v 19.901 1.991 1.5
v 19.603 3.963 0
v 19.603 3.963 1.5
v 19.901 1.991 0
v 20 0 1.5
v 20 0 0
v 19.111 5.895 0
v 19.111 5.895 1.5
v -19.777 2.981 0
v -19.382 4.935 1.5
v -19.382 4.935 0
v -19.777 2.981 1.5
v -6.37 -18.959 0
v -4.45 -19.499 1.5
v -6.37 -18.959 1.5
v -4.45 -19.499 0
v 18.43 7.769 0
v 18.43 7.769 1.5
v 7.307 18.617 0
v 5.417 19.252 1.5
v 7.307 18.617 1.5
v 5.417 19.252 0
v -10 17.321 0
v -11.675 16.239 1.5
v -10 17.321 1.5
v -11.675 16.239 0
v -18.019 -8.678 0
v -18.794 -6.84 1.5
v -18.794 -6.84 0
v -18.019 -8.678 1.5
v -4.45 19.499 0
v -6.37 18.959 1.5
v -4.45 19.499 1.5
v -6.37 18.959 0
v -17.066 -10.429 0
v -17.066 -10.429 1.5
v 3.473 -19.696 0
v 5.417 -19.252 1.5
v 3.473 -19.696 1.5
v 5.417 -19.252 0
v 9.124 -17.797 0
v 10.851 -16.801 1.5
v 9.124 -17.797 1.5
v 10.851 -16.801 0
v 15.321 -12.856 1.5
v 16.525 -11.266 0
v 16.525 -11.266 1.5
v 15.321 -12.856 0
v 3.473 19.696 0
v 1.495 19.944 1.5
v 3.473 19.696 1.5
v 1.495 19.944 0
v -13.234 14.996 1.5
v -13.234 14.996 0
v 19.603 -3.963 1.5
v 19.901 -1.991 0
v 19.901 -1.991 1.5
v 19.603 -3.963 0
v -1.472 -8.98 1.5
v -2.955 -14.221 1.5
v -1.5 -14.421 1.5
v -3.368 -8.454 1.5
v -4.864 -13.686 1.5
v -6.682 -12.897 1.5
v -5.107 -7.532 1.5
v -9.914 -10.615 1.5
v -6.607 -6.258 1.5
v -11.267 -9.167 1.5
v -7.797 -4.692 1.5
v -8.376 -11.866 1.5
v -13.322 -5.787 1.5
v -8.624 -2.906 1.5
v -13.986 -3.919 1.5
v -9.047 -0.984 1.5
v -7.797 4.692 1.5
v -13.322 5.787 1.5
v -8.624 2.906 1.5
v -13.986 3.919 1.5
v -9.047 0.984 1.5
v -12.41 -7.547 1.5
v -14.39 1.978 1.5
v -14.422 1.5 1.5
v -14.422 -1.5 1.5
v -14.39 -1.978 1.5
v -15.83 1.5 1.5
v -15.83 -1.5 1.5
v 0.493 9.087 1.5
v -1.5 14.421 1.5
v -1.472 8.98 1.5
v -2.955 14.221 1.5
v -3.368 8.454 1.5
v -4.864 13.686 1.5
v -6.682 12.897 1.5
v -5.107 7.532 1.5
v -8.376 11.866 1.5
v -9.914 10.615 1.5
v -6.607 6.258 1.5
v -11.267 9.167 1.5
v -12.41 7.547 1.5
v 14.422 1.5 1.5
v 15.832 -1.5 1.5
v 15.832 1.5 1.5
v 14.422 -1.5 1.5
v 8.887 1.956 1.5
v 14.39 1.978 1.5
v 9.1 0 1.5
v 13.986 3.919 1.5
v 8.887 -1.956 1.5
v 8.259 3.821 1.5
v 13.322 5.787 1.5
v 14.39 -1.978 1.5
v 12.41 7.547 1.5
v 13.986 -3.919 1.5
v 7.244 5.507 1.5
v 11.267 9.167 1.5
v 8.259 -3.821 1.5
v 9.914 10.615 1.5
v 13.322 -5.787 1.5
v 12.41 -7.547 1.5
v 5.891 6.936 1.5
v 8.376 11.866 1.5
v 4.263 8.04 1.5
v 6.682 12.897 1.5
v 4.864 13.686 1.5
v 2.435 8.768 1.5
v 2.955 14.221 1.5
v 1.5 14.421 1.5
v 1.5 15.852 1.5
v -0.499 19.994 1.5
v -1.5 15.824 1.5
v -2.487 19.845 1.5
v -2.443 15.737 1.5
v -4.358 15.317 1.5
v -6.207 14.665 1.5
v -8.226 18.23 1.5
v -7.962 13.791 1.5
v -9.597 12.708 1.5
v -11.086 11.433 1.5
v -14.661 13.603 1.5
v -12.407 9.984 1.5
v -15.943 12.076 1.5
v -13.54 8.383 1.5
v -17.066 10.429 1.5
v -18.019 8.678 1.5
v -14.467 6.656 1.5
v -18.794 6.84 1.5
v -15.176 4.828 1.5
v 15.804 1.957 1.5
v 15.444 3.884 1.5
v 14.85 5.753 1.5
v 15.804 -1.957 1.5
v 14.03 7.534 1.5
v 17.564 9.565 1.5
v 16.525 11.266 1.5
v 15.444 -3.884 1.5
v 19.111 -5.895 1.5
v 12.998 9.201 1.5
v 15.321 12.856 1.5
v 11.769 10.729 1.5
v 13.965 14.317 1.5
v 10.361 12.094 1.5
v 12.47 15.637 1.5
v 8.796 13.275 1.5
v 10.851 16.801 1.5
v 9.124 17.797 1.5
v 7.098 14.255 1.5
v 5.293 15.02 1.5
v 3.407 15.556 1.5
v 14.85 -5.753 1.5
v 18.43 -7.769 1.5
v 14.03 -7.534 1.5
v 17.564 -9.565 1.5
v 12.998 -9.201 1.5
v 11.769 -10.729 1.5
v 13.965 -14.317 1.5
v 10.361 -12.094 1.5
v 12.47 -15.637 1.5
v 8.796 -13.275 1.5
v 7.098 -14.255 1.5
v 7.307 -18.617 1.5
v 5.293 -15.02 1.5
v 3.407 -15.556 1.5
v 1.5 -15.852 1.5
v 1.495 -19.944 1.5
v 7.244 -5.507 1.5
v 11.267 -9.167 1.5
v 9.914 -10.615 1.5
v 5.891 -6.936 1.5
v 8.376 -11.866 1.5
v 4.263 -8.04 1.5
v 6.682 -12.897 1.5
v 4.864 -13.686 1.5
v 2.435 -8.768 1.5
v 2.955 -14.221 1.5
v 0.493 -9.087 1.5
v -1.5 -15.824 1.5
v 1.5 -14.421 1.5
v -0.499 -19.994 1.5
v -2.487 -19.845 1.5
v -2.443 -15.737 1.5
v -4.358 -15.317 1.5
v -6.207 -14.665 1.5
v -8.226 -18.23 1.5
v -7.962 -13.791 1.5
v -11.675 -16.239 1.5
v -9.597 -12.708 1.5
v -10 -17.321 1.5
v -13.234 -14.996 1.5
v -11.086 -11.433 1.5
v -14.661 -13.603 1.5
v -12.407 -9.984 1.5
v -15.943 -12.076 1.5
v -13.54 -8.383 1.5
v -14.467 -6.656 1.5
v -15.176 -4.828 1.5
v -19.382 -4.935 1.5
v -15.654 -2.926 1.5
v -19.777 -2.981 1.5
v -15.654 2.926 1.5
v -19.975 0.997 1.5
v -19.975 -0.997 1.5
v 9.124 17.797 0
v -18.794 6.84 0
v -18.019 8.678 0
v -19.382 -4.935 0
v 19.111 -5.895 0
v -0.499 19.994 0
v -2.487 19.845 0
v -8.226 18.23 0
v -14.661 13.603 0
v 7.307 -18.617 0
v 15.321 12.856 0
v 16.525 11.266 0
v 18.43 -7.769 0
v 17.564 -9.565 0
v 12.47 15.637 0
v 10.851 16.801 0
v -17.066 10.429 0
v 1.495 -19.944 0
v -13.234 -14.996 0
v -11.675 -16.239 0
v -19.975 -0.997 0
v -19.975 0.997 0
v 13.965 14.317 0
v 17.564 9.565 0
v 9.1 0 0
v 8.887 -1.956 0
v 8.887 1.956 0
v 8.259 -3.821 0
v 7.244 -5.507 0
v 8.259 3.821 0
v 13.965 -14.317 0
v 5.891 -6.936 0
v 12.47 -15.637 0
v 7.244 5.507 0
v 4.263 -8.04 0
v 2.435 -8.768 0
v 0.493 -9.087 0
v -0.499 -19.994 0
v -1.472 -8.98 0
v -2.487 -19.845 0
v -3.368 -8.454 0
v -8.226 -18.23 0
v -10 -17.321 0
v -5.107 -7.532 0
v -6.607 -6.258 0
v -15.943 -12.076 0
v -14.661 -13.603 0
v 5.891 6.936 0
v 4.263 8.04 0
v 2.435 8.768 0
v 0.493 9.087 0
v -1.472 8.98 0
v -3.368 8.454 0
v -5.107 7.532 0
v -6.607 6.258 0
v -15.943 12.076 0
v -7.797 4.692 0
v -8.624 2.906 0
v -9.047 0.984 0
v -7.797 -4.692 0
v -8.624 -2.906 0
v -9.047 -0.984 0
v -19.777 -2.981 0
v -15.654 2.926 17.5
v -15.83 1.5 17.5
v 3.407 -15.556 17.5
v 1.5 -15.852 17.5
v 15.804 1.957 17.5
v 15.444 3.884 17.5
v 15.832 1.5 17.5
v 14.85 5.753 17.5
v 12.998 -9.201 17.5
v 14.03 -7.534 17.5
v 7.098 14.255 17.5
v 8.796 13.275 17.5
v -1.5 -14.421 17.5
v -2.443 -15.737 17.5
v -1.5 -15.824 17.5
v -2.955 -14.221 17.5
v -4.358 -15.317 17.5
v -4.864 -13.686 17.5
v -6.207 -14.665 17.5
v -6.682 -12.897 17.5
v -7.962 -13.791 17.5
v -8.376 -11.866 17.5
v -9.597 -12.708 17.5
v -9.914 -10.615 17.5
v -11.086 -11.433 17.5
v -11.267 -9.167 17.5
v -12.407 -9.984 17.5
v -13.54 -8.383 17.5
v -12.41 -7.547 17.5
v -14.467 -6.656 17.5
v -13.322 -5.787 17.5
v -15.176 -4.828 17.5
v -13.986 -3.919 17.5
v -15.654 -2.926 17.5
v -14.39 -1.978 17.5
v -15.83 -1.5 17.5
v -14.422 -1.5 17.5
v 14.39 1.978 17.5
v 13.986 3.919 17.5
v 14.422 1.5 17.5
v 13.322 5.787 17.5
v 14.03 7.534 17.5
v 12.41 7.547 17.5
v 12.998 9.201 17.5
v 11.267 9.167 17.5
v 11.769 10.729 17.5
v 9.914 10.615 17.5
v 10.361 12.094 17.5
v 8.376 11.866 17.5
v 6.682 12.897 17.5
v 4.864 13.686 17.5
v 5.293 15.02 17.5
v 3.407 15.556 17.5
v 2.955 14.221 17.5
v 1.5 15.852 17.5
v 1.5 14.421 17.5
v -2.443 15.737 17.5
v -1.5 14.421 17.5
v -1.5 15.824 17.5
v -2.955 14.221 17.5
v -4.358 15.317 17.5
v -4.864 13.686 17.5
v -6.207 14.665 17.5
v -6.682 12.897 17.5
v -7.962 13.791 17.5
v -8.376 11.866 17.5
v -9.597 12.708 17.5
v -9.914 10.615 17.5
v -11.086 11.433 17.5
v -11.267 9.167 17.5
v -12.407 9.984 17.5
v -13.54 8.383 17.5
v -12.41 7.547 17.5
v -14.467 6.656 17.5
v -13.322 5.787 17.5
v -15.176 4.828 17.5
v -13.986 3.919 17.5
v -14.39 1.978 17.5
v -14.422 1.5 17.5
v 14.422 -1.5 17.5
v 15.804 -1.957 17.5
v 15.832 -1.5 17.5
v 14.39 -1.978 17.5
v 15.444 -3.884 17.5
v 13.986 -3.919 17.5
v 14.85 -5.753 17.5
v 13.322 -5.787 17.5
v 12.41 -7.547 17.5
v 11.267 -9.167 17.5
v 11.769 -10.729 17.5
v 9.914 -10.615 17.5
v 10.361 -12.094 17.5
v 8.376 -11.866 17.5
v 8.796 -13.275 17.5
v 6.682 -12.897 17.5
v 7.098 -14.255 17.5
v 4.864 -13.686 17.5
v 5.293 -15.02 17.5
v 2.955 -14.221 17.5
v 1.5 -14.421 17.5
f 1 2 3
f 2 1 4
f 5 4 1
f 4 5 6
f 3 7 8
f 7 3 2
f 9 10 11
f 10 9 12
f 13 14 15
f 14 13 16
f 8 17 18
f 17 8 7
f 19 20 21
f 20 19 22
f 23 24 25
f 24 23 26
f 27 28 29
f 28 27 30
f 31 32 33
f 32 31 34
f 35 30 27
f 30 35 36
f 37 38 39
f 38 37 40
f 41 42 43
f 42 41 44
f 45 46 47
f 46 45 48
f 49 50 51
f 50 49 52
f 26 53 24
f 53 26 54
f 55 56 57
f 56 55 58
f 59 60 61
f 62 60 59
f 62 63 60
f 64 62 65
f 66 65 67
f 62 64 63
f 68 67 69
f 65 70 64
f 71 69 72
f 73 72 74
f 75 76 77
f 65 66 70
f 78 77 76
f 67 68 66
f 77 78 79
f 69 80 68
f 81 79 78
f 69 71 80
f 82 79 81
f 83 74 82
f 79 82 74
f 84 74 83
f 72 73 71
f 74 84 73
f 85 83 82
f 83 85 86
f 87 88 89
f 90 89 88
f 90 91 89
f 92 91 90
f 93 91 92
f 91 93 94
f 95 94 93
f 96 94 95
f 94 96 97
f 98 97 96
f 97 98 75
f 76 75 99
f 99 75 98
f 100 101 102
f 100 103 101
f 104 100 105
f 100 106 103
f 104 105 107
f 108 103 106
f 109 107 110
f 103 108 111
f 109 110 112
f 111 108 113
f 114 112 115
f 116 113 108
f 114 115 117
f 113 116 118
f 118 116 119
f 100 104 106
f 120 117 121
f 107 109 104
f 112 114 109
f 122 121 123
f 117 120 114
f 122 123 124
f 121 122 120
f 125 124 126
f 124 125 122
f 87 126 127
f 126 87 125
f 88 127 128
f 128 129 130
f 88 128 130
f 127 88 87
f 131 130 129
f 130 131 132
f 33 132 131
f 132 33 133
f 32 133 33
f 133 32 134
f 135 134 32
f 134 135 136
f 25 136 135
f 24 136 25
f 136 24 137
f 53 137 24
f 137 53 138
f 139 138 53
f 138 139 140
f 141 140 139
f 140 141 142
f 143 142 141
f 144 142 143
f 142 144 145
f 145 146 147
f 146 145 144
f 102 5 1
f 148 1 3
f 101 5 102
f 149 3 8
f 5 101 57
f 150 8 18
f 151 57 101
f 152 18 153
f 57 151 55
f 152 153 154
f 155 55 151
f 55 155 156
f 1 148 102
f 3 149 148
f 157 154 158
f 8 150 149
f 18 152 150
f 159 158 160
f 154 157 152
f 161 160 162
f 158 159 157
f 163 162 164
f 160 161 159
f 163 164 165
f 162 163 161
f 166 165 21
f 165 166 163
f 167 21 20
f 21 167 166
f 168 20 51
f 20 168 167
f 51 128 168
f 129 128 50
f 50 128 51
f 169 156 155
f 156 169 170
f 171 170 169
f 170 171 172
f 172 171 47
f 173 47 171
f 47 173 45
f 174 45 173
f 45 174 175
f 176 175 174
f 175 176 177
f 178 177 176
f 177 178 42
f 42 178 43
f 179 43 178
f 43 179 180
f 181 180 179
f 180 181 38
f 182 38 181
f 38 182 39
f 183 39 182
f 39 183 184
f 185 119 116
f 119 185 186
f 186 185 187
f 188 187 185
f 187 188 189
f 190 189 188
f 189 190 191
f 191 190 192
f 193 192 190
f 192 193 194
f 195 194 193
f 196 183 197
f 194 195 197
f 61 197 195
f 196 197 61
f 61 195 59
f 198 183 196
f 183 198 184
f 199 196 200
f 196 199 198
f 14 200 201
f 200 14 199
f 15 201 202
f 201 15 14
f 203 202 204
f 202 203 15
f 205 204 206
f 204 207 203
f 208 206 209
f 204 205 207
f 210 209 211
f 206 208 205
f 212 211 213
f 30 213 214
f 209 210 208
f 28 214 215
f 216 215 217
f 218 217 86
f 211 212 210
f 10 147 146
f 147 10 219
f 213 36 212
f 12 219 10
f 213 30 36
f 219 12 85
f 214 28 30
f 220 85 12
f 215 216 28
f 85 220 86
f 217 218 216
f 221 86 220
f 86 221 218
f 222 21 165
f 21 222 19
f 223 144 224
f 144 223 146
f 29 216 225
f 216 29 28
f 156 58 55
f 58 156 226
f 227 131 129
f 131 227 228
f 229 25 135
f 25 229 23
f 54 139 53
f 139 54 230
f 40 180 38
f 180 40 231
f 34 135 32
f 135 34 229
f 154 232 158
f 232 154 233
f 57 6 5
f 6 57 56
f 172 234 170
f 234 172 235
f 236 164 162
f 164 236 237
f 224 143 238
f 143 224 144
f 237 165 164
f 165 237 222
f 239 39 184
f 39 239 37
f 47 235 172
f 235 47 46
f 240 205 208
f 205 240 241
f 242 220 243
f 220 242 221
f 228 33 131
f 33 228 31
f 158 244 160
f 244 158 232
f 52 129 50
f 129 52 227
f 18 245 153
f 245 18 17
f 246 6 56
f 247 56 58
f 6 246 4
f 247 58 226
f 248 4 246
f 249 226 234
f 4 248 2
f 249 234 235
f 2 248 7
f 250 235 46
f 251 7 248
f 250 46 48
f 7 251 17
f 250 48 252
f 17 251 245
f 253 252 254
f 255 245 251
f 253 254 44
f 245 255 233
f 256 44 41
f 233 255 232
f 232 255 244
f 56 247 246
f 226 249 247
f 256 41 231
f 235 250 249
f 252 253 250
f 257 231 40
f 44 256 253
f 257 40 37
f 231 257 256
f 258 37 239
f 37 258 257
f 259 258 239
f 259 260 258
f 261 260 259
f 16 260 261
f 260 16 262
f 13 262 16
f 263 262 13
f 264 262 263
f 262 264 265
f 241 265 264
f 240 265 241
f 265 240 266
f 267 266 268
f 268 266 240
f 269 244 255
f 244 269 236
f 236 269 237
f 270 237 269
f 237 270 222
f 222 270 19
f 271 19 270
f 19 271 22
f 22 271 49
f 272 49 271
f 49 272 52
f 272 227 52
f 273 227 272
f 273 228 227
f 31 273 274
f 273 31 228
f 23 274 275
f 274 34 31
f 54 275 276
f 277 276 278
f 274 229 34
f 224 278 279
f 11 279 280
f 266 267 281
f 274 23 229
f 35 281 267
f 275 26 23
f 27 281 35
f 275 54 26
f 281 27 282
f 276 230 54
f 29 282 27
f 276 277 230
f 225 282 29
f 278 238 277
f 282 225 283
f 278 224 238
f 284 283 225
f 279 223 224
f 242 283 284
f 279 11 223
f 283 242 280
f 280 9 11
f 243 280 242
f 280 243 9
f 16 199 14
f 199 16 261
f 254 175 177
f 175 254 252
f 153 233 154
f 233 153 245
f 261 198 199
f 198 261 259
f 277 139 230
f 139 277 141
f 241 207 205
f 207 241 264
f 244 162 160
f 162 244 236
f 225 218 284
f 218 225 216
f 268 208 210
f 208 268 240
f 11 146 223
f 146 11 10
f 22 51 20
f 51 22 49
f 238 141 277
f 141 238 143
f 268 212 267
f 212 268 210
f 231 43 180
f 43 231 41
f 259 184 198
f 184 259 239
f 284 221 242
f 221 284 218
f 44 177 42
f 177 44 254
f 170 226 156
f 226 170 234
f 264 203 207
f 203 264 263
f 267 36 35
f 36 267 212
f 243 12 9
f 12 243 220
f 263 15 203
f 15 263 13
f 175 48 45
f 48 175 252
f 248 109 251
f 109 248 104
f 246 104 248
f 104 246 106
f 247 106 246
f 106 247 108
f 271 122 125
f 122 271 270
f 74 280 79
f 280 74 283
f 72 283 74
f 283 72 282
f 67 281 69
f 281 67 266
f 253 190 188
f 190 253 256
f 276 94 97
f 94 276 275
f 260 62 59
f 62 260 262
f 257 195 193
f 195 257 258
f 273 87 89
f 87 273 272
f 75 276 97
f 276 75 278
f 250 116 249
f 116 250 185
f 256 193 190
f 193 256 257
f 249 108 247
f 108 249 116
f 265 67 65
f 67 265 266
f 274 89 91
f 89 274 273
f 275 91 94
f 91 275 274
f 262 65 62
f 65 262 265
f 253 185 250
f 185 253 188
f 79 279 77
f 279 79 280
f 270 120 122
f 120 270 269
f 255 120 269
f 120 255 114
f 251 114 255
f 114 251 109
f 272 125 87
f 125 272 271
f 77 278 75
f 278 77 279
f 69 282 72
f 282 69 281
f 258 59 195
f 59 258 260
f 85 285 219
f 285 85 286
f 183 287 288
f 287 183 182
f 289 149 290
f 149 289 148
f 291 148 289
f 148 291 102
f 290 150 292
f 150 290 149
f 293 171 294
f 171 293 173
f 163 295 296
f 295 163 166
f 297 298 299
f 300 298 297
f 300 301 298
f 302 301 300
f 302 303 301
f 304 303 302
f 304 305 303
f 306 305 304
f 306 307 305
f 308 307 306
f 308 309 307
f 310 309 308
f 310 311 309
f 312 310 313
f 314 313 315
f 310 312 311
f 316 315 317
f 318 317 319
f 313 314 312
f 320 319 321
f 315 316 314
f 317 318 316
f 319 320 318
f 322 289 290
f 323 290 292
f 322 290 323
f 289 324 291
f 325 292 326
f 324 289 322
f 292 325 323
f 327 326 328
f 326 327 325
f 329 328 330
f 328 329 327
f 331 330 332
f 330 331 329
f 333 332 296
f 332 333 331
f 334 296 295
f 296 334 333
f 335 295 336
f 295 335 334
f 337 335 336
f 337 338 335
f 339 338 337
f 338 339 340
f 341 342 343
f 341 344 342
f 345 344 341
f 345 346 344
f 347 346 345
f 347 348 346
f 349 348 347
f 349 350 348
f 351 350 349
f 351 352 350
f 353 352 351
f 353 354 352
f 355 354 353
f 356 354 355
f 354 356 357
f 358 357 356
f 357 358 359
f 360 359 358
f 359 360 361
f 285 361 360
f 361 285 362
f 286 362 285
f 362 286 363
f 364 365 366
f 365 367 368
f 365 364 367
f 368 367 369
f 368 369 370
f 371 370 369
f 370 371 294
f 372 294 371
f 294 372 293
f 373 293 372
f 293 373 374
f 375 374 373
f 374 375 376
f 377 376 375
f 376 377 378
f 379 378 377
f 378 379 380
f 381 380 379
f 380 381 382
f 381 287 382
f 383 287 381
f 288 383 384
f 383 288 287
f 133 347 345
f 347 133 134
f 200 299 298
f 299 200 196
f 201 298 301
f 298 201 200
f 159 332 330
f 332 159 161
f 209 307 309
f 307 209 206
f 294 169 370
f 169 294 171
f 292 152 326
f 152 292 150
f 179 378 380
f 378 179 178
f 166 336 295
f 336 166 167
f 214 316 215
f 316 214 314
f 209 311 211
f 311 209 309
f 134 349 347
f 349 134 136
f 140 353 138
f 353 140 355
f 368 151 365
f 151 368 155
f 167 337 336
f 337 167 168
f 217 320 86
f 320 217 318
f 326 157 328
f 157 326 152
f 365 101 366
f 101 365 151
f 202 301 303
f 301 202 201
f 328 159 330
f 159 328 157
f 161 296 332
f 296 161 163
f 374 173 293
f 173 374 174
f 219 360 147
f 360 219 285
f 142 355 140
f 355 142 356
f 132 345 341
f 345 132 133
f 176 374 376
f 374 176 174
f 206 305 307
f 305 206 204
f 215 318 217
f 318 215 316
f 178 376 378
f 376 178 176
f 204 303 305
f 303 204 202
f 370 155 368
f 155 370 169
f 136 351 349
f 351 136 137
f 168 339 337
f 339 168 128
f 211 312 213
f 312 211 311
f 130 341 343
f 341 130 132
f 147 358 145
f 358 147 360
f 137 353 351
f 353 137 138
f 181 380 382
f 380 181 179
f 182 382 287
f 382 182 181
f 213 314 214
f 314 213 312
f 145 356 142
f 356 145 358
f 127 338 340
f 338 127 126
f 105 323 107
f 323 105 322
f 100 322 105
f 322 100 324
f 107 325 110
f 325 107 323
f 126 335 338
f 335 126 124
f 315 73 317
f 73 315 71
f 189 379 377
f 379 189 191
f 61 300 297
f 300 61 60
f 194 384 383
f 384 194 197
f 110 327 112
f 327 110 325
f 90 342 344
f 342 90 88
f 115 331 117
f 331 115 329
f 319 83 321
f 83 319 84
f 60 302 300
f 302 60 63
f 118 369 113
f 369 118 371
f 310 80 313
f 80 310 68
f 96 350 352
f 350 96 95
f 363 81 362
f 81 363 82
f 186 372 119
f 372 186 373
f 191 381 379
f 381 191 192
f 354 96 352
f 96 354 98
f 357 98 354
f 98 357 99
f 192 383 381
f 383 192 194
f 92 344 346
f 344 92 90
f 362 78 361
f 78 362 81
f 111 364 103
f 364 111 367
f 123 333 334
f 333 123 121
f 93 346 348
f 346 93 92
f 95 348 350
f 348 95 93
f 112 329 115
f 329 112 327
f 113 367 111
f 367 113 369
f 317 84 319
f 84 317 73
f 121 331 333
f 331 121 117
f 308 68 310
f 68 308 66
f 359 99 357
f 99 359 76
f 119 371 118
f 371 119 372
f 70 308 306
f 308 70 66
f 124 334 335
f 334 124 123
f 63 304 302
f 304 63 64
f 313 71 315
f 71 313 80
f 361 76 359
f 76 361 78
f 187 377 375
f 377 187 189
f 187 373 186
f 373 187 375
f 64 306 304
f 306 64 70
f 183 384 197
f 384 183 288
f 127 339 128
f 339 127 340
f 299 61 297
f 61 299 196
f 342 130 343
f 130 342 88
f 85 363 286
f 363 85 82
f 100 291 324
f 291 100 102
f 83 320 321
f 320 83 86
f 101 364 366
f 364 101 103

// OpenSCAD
 SpoolSize = 31.85;
 TabThickness = 1.4;
 BackplateRim = 8.25;
 BackplateThickness = 2.1;
 TabGap = 3;
 TabDepth = 16;
 SpoolRodSize = 18.1;
 Tolerance = 0.1;
 
 TabSize = TabThickness *2;
 
 union(){
     difference(){
        cylinder(h = 1.5,d = SpoolSize + BackplateRim - Tolerance, $fa = 0.1);
        cylinder(h = 1.5,d = SpoolRodSize + Tolerance, $fa = 0.1);
    };
    
    translate( v = [0,0,1.5] ){
        difference(){
                difference(){
                    cylinder(h = TabDepth, d = SpoolSize, $fa = 0.1);
                    cylinder(h = TabDepth, d = (SpoolSize - TabSize), $fa = 0.1);
                }
                translate( v = [- .5 * TabGap,-.5 * SpoolSize,0])
                    cube(size = [TabGap,SpoolSize,TabDepth]);
                translate( v = [-.5 * SpoolSize,-.5 * TabGap,0])
                    cube(size = [SpoolSize,TabGap,TabDepth]);
                    
            }
    }
}
